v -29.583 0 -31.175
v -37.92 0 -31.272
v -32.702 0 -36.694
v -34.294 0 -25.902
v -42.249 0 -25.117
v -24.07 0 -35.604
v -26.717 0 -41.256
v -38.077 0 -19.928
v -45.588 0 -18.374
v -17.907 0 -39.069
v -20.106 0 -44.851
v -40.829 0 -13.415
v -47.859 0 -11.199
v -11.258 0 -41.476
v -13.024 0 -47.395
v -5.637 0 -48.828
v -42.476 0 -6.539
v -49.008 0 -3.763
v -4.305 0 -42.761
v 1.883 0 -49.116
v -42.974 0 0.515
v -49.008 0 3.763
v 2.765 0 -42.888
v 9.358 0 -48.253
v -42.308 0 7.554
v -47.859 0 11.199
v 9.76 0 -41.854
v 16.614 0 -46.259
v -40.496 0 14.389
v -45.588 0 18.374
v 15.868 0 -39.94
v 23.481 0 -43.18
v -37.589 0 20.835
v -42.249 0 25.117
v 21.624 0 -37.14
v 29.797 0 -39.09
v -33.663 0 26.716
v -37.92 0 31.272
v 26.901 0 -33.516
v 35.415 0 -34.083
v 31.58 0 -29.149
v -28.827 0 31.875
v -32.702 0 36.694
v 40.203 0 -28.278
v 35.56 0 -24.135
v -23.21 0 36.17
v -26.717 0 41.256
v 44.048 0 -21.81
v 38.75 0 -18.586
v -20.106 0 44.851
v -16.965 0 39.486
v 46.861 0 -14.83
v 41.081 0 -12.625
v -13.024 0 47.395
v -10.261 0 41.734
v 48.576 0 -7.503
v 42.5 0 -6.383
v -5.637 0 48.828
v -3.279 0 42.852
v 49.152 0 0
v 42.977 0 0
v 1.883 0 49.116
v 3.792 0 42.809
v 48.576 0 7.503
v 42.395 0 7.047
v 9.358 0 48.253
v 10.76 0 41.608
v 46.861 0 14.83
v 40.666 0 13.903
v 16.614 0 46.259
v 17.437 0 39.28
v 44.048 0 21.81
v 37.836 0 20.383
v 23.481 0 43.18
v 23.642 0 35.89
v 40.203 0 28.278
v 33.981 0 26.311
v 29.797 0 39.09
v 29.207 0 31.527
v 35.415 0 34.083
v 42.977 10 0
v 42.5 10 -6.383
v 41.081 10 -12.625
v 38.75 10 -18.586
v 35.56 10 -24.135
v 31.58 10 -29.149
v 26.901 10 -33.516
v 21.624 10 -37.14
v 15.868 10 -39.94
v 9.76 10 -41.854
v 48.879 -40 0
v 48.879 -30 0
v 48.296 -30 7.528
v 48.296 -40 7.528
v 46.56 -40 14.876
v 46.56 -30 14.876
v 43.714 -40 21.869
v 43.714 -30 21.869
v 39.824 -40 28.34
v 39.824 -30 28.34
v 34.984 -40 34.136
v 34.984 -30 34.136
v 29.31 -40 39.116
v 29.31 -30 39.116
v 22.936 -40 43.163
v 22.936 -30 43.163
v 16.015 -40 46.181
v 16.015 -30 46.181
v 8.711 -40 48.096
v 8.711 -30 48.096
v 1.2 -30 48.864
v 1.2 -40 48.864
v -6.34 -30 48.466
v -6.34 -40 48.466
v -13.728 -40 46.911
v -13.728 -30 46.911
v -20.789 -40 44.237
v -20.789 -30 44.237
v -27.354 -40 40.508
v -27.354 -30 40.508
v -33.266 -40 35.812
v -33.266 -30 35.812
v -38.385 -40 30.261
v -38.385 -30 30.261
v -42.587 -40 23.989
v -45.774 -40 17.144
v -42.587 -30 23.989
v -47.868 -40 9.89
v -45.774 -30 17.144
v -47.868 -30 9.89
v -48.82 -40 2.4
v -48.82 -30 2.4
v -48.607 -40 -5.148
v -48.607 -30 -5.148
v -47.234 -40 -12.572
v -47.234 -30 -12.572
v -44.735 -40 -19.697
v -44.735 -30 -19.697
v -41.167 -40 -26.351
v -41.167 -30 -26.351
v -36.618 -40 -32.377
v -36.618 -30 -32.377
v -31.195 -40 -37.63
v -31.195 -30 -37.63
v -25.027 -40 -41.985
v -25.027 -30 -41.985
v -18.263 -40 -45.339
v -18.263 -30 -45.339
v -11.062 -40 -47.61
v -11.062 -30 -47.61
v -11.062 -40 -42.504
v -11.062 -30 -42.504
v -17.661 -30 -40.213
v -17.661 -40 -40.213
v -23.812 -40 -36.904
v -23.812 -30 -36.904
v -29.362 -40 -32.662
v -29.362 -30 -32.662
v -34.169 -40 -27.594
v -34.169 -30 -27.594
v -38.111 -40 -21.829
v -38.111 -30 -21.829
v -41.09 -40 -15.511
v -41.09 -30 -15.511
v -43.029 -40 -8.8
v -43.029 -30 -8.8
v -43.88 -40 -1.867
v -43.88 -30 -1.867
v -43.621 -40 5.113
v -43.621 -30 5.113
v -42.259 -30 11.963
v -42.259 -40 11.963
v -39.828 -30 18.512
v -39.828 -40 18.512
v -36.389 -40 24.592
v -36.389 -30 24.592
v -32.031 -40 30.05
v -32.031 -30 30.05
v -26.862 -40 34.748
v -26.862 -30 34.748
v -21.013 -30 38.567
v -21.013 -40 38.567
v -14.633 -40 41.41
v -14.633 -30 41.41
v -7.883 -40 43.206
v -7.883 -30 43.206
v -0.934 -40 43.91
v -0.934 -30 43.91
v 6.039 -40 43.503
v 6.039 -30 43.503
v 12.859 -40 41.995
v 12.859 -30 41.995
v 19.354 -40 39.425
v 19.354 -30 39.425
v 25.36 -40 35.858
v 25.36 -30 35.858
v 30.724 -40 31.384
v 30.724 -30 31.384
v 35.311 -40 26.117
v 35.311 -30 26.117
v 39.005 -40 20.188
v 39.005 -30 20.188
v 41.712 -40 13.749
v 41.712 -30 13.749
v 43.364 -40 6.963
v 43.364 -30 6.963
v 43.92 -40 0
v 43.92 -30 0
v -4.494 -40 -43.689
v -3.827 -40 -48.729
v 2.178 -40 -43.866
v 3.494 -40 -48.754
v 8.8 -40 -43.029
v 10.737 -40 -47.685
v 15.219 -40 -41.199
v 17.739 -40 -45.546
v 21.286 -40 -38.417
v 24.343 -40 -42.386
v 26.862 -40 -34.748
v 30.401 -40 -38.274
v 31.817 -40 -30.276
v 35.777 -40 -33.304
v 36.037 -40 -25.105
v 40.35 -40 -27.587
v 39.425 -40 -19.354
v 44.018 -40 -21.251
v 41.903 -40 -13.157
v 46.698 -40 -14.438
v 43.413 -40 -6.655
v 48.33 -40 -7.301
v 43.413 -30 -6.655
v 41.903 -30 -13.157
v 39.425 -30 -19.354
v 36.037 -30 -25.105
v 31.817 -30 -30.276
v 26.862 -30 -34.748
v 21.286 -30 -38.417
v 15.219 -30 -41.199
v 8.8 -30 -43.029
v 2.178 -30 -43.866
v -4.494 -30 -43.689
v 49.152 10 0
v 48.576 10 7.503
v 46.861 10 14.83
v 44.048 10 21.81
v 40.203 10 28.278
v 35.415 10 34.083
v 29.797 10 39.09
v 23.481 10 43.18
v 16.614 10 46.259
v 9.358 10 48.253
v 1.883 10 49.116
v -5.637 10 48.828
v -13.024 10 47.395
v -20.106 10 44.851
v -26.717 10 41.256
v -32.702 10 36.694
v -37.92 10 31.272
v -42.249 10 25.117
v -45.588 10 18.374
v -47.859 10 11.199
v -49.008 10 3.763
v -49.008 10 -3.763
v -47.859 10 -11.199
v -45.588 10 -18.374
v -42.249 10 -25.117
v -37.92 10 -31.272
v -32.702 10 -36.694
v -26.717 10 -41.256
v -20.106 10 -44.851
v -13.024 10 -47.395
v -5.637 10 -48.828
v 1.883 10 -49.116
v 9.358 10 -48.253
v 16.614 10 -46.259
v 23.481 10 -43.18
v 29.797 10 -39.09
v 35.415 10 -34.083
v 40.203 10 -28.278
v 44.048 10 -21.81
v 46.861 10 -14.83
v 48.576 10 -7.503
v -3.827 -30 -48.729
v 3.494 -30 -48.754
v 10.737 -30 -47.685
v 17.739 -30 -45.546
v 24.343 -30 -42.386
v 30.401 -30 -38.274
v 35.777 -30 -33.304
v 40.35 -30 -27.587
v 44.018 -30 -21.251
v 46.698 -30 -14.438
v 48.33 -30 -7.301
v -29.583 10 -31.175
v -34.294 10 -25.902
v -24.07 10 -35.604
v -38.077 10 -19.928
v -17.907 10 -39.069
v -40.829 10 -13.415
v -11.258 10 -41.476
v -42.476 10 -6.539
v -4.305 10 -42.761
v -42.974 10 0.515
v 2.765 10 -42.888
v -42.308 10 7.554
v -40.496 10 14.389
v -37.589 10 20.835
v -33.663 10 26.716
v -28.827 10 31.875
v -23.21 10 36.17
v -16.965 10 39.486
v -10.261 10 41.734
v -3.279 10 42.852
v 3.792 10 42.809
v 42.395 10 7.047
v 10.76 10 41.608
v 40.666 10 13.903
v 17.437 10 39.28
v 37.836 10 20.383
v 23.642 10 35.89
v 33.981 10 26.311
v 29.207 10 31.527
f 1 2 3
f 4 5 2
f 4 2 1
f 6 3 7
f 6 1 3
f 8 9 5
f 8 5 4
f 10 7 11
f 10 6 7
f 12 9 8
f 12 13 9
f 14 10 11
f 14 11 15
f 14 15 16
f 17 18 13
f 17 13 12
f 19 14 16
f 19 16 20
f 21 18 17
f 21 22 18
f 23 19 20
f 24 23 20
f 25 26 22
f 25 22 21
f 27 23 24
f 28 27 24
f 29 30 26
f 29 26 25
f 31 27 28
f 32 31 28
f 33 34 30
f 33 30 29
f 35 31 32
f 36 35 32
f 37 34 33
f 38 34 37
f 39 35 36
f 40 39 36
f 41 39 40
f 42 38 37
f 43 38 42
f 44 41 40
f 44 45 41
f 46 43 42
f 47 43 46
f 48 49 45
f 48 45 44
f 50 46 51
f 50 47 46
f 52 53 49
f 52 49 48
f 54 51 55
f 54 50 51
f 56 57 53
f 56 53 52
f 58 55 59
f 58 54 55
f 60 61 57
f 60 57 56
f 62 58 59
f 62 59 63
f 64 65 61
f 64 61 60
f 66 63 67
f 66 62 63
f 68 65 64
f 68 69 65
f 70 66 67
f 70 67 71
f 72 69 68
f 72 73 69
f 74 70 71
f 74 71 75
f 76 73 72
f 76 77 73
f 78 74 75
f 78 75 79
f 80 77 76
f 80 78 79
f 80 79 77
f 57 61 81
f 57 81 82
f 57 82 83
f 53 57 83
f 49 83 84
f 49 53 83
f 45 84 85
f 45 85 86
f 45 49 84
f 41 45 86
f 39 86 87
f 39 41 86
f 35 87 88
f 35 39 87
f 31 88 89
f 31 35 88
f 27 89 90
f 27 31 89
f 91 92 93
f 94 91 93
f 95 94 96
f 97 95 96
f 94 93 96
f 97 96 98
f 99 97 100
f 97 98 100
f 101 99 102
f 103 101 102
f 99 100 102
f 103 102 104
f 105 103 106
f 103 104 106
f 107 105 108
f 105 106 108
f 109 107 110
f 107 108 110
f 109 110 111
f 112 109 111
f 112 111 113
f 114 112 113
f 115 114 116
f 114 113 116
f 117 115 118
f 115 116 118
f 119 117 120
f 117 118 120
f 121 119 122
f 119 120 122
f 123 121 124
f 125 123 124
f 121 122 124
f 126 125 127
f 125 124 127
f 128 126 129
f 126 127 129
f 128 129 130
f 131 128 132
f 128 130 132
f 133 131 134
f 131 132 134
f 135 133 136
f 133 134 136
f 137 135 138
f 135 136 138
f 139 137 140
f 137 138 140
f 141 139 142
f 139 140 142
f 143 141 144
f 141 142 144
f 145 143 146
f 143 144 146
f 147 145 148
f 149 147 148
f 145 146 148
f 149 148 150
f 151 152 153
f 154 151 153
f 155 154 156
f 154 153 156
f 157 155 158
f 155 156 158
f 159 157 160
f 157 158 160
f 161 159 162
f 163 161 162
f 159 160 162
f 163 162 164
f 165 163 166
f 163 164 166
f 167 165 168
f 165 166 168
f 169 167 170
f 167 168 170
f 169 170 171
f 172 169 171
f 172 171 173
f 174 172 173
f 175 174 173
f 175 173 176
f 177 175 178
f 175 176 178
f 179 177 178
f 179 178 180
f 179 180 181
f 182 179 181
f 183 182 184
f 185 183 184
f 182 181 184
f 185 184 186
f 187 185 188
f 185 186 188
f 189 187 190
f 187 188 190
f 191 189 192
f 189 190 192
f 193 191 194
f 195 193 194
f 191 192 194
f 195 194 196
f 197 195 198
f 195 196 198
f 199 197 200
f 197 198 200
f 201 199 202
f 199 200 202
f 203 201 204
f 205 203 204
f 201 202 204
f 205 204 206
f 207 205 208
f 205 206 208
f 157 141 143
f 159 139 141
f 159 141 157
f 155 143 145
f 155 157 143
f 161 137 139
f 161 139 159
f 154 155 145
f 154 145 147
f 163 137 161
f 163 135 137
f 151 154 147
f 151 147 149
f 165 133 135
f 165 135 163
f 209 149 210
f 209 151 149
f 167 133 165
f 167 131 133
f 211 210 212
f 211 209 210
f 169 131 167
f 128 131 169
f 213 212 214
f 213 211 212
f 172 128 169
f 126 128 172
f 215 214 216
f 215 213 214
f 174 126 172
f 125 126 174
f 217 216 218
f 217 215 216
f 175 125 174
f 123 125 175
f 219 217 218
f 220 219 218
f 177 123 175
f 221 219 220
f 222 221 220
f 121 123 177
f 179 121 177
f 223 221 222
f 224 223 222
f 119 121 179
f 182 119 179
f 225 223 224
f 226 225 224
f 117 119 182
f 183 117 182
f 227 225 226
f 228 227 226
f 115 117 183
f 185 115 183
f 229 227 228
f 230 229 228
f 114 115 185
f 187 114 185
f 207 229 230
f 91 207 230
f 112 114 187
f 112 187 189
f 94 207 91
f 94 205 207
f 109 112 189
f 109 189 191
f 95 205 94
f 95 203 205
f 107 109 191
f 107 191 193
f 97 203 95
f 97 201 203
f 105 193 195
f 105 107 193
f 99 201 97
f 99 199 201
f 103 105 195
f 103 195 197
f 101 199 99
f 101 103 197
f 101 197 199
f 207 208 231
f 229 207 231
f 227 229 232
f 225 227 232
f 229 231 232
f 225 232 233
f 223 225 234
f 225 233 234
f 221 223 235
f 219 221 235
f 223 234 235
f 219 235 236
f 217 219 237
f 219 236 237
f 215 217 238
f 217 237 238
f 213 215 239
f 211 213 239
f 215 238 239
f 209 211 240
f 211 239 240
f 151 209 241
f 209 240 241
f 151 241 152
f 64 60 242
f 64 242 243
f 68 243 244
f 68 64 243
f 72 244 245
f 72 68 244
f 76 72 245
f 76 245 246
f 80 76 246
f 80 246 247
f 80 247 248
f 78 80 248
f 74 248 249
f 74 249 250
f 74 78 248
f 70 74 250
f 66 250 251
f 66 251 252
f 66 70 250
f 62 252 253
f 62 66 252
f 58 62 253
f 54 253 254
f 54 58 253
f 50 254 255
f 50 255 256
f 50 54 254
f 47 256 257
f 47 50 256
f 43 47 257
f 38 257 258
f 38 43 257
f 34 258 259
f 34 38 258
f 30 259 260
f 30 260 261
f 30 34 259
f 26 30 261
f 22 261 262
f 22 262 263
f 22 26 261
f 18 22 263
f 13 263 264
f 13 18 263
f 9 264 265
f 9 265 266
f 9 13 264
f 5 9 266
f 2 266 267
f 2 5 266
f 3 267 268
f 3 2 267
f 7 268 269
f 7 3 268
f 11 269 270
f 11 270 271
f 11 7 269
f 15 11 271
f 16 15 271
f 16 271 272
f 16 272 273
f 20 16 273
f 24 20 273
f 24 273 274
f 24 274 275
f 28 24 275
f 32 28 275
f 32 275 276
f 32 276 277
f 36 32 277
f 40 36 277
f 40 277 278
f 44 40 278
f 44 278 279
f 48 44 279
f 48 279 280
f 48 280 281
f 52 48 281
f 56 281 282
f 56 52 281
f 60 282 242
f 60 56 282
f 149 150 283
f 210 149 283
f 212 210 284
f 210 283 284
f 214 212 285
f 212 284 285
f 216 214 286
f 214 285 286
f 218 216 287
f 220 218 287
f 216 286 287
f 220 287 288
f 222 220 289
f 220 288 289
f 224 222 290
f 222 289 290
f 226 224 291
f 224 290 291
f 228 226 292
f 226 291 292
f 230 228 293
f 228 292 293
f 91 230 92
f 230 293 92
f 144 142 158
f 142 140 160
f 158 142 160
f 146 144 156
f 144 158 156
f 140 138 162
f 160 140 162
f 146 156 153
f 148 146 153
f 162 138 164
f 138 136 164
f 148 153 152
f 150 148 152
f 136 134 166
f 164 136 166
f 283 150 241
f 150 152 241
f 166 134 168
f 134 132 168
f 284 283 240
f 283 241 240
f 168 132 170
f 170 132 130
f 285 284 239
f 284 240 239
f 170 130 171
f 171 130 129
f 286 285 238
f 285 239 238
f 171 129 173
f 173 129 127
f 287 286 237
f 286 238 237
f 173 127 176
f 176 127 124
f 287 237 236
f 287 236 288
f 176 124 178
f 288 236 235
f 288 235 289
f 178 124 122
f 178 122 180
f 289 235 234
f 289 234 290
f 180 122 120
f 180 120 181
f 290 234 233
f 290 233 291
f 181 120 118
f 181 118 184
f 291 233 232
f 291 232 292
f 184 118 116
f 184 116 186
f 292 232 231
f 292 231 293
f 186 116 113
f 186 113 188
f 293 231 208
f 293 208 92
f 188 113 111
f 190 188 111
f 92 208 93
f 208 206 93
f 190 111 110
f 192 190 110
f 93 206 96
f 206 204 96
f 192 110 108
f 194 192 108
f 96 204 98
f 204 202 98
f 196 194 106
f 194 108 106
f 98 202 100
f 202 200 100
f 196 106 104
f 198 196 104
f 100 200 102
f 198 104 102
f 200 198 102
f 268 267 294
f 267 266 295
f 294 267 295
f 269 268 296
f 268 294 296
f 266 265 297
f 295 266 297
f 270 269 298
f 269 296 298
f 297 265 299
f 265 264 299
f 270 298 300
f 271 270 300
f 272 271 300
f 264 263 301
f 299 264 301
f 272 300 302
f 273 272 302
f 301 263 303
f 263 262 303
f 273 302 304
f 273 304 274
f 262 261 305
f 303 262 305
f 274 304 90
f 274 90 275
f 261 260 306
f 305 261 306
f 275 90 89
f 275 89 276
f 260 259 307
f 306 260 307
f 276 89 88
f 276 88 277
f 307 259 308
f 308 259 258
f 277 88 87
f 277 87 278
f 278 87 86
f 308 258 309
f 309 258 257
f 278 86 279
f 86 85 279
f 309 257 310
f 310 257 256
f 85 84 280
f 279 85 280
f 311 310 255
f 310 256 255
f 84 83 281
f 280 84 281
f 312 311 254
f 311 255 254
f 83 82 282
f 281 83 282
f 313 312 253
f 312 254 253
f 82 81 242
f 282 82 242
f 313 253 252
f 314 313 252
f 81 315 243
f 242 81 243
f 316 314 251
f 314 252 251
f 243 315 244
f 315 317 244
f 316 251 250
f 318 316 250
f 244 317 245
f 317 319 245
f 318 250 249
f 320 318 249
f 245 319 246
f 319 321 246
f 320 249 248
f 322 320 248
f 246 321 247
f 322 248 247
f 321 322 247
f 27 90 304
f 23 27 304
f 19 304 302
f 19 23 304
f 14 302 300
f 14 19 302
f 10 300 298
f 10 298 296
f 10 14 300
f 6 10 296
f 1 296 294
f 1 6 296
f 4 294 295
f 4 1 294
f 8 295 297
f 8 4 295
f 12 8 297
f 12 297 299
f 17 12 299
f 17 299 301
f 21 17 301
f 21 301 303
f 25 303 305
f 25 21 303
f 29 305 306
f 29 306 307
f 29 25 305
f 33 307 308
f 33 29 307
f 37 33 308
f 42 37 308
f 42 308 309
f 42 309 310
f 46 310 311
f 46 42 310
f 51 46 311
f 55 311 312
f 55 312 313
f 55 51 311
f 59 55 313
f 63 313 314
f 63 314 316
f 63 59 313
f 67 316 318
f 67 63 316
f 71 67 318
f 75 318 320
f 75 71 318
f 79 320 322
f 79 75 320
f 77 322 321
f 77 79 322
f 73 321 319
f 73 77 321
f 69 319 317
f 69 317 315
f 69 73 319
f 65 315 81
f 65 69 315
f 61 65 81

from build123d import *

# Parameters (mm, degrees)
F4_R     = 49.151803
F2_DEPTH = 10
F5_DEPTH = 10


with BuildPart() as f2:
    # F4 (on face) → F2 (new body)
    with BuildSketch(Plane.XZ):
        Circle(F4_R)
        with BuildLine():
            ThreePointArc((9.760141, -41.853813), (-33.663491, 26.7165), (42.976761, 0))
            ThreePointArc((42.976761, 0), (33.663491, -26.7165), (9.760141, -41.853813))
        make_face(mode=Mode.SUBTRACT)
    extrude(amount=-F2_DEPTH)


with BuildPart() as f5:
    # F1 (on offset) → F5 (new body)
    with BuildSketch(Plane.XZ.offset(30)):
        with BuildLine():
            ThreePointArc((-11.06216, -47.610492), (30.400871, -38.274238), (48.878731, 0))
            ThreePointArc((48.878731, 0), (-30.400871, 38.274238), (-11.06216, -47.610492))
        make_face()
        with BuildLine():
            ThreePointArc((43.919714, 0), (26.86163, -34.747577), (-11.06216, -42.503763))
            ThreePointArc((-11.06216, -42.503763), (-26.86163, 34.747577), (43.919714, 0))
        make_face(mode=Mode.SUBTRACT)
    extrude(amount=F5_DEPTH)


solid = Compound([f2.part, f5.part])
